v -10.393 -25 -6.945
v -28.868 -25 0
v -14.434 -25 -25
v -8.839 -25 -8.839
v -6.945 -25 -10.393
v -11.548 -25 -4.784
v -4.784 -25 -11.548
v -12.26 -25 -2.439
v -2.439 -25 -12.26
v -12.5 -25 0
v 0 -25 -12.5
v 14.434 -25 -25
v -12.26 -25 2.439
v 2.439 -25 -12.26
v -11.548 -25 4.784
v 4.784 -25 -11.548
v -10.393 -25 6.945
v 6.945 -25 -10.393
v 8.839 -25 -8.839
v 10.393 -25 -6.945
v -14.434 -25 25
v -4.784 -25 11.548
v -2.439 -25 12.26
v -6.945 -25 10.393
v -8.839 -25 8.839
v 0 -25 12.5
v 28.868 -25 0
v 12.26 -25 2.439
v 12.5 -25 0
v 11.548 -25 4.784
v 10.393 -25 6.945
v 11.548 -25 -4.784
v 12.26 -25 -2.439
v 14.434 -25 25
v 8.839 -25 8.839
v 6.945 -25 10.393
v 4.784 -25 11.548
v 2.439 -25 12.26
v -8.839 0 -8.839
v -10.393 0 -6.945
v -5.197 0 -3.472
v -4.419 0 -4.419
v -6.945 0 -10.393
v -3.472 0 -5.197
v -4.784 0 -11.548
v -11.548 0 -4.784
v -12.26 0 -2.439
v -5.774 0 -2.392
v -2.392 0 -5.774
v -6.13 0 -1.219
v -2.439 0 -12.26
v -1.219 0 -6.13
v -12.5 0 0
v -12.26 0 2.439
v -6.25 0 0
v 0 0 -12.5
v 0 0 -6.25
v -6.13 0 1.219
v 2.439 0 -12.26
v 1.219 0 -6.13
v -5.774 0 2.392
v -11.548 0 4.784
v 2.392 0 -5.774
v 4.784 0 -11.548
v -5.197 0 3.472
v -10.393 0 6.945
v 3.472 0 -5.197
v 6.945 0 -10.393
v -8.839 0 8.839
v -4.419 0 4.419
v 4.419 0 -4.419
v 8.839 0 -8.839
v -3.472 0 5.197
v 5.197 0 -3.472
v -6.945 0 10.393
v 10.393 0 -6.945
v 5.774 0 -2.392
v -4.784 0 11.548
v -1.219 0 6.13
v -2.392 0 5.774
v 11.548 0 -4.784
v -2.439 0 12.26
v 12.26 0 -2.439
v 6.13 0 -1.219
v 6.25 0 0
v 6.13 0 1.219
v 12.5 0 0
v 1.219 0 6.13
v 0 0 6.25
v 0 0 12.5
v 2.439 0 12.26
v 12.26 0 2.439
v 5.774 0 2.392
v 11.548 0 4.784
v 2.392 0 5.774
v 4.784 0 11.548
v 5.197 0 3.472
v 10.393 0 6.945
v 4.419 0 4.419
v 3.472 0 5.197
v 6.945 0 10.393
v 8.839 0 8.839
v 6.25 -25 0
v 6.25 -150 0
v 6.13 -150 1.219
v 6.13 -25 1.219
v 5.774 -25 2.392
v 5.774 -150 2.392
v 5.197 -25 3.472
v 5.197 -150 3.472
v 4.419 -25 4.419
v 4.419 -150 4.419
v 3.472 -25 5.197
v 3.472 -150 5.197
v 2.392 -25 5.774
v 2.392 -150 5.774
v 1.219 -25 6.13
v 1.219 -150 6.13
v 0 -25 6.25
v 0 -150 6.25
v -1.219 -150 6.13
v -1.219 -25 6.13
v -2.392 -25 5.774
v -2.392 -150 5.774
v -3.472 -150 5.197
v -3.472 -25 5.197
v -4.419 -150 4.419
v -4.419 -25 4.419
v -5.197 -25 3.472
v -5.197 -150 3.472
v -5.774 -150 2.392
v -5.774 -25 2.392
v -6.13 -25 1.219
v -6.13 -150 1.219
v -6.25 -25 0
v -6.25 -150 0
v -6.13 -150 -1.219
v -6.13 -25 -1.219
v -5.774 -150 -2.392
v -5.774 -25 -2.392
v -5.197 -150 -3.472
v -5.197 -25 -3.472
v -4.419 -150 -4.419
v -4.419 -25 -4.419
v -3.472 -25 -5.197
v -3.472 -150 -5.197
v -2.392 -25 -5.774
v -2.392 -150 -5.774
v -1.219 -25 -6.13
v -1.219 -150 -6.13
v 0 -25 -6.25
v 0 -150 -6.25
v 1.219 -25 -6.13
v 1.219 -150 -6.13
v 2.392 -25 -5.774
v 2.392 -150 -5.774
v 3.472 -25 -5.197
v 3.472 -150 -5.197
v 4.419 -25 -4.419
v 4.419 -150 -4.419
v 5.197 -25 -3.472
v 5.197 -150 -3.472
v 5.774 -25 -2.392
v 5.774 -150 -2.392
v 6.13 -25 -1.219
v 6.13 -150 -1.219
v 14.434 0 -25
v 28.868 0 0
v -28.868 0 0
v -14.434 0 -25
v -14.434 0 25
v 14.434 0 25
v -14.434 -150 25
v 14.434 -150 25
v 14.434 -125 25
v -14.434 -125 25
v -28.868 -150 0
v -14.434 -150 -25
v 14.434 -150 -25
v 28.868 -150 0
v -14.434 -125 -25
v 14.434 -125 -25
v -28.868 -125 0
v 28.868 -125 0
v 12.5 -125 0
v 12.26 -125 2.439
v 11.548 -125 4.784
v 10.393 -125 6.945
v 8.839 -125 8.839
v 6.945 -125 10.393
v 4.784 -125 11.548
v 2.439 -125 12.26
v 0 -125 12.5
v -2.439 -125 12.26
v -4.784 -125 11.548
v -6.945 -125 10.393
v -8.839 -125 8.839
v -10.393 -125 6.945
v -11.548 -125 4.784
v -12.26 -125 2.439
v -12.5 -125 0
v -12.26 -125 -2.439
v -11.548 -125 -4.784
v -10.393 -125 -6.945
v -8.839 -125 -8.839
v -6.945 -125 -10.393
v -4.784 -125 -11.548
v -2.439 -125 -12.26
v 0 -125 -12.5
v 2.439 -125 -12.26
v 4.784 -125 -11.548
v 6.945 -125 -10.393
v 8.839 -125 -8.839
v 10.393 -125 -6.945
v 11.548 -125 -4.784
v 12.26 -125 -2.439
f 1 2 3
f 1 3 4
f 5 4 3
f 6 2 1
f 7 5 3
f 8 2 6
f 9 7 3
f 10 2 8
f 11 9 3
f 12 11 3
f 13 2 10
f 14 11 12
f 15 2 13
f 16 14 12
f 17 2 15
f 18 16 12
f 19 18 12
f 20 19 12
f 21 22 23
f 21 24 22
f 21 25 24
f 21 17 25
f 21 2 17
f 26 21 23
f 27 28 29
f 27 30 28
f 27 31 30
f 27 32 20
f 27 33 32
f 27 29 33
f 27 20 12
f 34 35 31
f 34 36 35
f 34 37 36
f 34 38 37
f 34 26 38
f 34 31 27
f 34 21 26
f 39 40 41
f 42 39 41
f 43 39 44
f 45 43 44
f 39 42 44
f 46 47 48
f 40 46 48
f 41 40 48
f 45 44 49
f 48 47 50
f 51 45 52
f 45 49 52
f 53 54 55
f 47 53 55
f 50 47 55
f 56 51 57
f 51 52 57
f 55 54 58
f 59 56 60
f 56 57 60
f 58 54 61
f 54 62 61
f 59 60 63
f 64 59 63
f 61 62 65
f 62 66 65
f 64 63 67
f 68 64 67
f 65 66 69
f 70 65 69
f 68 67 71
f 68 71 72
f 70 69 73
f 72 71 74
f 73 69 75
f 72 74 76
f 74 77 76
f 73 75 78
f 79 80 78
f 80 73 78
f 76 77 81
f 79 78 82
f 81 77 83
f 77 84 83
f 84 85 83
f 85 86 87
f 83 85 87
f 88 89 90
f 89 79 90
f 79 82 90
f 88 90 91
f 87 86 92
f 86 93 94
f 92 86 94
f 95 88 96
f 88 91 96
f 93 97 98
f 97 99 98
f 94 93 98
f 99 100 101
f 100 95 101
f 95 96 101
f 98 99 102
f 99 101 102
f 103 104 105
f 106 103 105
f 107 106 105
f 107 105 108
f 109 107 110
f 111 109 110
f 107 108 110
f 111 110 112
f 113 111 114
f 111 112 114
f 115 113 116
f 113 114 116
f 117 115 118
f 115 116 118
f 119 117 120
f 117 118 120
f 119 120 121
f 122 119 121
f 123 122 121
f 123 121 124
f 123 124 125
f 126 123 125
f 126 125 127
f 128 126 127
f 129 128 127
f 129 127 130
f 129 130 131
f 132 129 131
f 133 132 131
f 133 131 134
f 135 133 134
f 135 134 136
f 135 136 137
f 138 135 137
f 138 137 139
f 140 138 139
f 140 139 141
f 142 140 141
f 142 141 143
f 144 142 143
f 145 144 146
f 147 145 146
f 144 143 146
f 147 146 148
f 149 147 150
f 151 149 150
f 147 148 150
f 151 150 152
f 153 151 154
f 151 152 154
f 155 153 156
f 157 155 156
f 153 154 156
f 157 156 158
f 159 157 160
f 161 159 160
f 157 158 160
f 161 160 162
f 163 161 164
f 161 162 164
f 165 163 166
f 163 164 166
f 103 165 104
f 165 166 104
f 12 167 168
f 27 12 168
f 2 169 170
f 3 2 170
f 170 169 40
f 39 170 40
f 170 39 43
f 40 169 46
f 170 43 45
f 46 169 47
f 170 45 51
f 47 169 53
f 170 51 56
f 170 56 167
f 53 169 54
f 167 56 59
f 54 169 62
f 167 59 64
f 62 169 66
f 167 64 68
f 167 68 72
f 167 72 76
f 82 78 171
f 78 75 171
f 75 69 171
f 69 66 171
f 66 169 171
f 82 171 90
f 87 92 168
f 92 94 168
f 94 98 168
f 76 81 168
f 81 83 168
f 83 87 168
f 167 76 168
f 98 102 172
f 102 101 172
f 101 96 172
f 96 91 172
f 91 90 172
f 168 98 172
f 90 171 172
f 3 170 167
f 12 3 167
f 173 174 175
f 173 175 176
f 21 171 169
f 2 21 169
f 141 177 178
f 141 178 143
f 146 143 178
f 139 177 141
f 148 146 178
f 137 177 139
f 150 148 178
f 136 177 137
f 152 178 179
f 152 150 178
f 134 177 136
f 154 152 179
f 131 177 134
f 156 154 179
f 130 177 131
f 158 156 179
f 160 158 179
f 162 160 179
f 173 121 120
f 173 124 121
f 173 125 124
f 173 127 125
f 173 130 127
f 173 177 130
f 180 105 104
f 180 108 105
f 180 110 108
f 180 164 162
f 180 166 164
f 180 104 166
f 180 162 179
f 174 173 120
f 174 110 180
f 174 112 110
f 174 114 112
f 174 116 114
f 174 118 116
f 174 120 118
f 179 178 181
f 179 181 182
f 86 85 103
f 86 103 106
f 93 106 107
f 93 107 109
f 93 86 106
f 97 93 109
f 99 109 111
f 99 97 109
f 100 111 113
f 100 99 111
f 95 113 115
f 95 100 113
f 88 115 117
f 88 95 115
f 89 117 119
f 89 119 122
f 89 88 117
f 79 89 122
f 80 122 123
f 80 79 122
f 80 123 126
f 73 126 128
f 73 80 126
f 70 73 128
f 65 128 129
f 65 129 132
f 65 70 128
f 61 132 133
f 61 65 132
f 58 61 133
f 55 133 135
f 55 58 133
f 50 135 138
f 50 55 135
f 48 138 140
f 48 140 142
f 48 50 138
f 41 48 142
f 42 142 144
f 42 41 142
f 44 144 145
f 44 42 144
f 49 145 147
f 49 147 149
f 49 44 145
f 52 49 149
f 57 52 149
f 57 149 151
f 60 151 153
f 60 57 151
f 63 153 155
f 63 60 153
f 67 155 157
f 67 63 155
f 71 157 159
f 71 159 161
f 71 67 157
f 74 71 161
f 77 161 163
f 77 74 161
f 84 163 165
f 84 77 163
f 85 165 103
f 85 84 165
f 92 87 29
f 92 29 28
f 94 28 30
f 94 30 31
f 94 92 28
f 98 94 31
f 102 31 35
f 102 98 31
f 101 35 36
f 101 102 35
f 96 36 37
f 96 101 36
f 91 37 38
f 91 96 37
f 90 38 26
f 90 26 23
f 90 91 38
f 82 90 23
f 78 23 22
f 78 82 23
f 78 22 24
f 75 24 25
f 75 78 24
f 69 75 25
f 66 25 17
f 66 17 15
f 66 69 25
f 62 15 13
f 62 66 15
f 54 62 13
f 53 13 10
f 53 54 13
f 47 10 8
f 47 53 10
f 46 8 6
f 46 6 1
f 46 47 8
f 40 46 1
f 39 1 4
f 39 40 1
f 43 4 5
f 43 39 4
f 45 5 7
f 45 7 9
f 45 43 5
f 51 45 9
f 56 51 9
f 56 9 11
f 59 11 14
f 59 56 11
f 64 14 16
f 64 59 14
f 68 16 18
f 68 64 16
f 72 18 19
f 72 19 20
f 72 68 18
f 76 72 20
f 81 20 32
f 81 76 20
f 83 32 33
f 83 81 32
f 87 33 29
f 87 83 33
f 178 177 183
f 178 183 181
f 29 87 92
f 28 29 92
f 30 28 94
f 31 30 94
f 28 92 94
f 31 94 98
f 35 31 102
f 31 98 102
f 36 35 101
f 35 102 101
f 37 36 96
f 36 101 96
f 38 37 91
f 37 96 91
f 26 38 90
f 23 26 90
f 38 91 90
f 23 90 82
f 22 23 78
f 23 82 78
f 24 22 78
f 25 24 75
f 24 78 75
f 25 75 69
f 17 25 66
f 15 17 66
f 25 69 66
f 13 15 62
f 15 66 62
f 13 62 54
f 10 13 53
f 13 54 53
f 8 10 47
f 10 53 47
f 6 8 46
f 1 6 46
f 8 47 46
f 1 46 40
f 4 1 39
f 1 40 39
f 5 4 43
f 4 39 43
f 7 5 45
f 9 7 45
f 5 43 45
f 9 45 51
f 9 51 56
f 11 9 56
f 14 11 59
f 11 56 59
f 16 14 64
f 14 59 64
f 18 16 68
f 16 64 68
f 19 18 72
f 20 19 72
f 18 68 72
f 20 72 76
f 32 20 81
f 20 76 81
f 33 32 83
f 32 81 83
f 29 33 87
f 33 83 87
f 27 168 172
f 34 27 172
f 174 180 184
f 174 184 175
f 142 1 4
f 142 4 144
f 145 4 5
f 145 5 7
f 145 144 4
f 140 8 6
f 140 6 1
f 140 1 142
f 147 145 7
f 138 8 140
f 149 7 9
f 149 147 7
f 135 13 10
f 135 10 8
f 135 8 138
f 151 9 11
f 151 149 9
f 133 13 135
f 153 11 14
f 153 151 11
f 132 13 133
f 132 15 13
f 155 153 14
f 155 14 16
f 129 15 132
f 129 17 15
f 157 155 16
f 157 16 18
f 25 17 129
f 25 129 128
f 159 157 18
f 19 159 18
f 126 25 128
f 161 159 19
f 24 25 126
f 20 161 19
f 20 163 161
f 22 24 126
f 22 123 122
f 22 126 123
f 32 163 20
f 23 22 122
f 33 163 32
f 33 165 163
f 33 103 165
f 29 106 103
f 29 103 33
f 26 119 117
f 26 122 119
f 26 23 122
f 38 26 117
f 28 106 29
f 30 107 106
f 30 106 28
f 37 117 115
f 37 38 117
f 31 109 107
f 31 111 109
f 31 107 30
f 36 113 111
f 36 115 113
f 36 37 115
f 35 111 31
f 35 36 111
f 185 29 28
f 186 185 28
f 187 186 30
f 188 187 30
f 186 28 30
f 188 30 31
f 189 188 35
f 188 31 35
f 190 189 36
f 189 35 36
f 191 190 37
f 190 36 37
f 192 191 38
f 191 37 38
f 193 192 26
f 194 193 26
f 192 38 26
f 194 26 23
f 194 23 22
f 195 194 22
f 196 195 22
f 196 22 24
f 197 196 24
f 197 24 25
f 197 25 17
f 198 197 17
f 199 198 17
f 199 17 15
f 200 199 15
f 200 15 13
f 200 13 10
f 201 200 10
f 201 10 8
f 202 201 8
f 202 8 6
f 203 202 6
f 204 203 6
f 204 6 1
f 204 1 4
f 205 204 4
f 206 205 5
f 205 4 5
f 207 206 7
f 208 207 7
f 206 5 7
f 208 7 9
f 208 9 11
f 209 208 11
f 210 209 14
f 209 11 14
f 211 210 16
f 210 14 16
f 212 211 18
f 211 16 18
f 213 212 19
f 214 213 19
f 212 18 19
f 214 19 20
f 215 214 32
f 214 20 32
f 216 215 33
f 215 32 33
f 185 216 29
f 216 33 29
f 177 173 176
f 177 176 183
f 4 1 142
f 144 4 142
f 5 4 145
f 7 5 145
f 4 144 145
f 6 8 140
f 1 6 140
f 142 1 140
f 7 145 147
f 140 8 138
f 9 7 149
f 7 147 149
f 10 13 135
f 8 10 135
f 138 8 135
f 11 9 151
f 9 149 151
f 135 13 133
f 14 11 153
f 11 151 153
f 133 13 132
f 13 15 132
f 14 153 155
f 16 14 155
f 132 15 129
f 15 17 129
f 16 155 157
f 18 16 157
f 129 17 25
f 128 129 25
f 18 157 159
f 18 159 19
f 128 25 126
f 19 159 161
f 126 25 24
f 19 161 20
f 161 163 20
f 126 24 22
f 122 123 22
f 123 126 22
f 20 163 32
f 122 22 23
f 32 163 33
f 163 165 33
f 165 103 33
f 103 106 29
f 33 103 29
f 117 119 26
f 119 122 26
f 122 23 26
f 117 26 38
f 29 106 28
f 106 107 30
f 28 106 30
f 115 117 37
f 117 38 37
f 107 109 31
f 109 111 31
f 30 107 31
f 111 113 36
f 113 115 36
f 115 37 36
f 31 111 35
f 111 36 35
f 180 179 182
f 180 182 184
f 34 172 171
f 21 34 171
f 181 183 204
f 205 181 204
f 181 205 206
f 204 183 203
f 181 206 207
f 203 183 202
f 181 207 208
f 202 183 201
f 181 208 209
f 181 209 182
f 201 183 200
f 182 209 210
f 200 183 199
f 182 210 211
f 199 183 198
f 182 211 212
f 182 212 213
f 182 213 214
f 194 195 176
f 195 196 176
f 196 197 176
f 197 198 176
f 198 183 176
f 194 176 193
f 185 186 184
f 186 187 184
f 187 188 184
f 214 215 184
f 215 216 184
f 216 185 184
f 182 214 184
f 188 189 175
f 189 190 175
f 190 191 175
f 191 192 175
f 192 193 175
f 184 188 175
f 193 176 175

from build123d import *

# Parameters (mm, degrees)
F0_R     = 12.5
F1_DEPTH = 25
F2_R     = 12.5
F2_R_2   = 6.25
F3_DEPTH = 50
F4_R     = 12.5
F4_R_2   = 6.25
F5_DEPTH = 25


with BuildPart() as f1:
    # F0 (on Front) → F1 (new body)
    with BuildSketch(Plane.XZ):
        Polygon((-14.4337567297, -25), (14.4337567297, -25), (28.8675134595, 0), (14.4337567297, 25), (-14.4337567297, 25), (-28.8675134595, 0), align=None)
        Circle(F0_R, mode=Mode.SUBTRACT)
    extrude(amount=F1_DEPTH)


with BuildPart() as f3:
    # F2 (on face) → F3 (new body)
    with BuildSketch(Plane.XZ.offset(25)):
        Circle(F2_R)
        Circle(F2_R_2, mode=Mode.SUBTRACT)
    extrude(amount=F3_DEPTH)

    # F6: F3, F1, F5 across face


with BuildPart() as f5:
    # F4 (on face) → F5 (new body)
    with BuildSketch(Plane.XZ):
        Circle(F4_R)
        Circle(F4_R_2, mode=Mode.SUBTRACT)
    extrude(amount=F5_DEPTH)


with BuildPart() as f3_1:
    add(f3.part)
    add(f3.part.mirror(Plane.XZ.offset(75)))
    add(f1.part.mirror(Plane.XZ.offset(75)))
    add(f5.part.mirror(Plane.XZ.offset(75)))


solid = Compound([f1.part, f5.part, f3_1.part])
